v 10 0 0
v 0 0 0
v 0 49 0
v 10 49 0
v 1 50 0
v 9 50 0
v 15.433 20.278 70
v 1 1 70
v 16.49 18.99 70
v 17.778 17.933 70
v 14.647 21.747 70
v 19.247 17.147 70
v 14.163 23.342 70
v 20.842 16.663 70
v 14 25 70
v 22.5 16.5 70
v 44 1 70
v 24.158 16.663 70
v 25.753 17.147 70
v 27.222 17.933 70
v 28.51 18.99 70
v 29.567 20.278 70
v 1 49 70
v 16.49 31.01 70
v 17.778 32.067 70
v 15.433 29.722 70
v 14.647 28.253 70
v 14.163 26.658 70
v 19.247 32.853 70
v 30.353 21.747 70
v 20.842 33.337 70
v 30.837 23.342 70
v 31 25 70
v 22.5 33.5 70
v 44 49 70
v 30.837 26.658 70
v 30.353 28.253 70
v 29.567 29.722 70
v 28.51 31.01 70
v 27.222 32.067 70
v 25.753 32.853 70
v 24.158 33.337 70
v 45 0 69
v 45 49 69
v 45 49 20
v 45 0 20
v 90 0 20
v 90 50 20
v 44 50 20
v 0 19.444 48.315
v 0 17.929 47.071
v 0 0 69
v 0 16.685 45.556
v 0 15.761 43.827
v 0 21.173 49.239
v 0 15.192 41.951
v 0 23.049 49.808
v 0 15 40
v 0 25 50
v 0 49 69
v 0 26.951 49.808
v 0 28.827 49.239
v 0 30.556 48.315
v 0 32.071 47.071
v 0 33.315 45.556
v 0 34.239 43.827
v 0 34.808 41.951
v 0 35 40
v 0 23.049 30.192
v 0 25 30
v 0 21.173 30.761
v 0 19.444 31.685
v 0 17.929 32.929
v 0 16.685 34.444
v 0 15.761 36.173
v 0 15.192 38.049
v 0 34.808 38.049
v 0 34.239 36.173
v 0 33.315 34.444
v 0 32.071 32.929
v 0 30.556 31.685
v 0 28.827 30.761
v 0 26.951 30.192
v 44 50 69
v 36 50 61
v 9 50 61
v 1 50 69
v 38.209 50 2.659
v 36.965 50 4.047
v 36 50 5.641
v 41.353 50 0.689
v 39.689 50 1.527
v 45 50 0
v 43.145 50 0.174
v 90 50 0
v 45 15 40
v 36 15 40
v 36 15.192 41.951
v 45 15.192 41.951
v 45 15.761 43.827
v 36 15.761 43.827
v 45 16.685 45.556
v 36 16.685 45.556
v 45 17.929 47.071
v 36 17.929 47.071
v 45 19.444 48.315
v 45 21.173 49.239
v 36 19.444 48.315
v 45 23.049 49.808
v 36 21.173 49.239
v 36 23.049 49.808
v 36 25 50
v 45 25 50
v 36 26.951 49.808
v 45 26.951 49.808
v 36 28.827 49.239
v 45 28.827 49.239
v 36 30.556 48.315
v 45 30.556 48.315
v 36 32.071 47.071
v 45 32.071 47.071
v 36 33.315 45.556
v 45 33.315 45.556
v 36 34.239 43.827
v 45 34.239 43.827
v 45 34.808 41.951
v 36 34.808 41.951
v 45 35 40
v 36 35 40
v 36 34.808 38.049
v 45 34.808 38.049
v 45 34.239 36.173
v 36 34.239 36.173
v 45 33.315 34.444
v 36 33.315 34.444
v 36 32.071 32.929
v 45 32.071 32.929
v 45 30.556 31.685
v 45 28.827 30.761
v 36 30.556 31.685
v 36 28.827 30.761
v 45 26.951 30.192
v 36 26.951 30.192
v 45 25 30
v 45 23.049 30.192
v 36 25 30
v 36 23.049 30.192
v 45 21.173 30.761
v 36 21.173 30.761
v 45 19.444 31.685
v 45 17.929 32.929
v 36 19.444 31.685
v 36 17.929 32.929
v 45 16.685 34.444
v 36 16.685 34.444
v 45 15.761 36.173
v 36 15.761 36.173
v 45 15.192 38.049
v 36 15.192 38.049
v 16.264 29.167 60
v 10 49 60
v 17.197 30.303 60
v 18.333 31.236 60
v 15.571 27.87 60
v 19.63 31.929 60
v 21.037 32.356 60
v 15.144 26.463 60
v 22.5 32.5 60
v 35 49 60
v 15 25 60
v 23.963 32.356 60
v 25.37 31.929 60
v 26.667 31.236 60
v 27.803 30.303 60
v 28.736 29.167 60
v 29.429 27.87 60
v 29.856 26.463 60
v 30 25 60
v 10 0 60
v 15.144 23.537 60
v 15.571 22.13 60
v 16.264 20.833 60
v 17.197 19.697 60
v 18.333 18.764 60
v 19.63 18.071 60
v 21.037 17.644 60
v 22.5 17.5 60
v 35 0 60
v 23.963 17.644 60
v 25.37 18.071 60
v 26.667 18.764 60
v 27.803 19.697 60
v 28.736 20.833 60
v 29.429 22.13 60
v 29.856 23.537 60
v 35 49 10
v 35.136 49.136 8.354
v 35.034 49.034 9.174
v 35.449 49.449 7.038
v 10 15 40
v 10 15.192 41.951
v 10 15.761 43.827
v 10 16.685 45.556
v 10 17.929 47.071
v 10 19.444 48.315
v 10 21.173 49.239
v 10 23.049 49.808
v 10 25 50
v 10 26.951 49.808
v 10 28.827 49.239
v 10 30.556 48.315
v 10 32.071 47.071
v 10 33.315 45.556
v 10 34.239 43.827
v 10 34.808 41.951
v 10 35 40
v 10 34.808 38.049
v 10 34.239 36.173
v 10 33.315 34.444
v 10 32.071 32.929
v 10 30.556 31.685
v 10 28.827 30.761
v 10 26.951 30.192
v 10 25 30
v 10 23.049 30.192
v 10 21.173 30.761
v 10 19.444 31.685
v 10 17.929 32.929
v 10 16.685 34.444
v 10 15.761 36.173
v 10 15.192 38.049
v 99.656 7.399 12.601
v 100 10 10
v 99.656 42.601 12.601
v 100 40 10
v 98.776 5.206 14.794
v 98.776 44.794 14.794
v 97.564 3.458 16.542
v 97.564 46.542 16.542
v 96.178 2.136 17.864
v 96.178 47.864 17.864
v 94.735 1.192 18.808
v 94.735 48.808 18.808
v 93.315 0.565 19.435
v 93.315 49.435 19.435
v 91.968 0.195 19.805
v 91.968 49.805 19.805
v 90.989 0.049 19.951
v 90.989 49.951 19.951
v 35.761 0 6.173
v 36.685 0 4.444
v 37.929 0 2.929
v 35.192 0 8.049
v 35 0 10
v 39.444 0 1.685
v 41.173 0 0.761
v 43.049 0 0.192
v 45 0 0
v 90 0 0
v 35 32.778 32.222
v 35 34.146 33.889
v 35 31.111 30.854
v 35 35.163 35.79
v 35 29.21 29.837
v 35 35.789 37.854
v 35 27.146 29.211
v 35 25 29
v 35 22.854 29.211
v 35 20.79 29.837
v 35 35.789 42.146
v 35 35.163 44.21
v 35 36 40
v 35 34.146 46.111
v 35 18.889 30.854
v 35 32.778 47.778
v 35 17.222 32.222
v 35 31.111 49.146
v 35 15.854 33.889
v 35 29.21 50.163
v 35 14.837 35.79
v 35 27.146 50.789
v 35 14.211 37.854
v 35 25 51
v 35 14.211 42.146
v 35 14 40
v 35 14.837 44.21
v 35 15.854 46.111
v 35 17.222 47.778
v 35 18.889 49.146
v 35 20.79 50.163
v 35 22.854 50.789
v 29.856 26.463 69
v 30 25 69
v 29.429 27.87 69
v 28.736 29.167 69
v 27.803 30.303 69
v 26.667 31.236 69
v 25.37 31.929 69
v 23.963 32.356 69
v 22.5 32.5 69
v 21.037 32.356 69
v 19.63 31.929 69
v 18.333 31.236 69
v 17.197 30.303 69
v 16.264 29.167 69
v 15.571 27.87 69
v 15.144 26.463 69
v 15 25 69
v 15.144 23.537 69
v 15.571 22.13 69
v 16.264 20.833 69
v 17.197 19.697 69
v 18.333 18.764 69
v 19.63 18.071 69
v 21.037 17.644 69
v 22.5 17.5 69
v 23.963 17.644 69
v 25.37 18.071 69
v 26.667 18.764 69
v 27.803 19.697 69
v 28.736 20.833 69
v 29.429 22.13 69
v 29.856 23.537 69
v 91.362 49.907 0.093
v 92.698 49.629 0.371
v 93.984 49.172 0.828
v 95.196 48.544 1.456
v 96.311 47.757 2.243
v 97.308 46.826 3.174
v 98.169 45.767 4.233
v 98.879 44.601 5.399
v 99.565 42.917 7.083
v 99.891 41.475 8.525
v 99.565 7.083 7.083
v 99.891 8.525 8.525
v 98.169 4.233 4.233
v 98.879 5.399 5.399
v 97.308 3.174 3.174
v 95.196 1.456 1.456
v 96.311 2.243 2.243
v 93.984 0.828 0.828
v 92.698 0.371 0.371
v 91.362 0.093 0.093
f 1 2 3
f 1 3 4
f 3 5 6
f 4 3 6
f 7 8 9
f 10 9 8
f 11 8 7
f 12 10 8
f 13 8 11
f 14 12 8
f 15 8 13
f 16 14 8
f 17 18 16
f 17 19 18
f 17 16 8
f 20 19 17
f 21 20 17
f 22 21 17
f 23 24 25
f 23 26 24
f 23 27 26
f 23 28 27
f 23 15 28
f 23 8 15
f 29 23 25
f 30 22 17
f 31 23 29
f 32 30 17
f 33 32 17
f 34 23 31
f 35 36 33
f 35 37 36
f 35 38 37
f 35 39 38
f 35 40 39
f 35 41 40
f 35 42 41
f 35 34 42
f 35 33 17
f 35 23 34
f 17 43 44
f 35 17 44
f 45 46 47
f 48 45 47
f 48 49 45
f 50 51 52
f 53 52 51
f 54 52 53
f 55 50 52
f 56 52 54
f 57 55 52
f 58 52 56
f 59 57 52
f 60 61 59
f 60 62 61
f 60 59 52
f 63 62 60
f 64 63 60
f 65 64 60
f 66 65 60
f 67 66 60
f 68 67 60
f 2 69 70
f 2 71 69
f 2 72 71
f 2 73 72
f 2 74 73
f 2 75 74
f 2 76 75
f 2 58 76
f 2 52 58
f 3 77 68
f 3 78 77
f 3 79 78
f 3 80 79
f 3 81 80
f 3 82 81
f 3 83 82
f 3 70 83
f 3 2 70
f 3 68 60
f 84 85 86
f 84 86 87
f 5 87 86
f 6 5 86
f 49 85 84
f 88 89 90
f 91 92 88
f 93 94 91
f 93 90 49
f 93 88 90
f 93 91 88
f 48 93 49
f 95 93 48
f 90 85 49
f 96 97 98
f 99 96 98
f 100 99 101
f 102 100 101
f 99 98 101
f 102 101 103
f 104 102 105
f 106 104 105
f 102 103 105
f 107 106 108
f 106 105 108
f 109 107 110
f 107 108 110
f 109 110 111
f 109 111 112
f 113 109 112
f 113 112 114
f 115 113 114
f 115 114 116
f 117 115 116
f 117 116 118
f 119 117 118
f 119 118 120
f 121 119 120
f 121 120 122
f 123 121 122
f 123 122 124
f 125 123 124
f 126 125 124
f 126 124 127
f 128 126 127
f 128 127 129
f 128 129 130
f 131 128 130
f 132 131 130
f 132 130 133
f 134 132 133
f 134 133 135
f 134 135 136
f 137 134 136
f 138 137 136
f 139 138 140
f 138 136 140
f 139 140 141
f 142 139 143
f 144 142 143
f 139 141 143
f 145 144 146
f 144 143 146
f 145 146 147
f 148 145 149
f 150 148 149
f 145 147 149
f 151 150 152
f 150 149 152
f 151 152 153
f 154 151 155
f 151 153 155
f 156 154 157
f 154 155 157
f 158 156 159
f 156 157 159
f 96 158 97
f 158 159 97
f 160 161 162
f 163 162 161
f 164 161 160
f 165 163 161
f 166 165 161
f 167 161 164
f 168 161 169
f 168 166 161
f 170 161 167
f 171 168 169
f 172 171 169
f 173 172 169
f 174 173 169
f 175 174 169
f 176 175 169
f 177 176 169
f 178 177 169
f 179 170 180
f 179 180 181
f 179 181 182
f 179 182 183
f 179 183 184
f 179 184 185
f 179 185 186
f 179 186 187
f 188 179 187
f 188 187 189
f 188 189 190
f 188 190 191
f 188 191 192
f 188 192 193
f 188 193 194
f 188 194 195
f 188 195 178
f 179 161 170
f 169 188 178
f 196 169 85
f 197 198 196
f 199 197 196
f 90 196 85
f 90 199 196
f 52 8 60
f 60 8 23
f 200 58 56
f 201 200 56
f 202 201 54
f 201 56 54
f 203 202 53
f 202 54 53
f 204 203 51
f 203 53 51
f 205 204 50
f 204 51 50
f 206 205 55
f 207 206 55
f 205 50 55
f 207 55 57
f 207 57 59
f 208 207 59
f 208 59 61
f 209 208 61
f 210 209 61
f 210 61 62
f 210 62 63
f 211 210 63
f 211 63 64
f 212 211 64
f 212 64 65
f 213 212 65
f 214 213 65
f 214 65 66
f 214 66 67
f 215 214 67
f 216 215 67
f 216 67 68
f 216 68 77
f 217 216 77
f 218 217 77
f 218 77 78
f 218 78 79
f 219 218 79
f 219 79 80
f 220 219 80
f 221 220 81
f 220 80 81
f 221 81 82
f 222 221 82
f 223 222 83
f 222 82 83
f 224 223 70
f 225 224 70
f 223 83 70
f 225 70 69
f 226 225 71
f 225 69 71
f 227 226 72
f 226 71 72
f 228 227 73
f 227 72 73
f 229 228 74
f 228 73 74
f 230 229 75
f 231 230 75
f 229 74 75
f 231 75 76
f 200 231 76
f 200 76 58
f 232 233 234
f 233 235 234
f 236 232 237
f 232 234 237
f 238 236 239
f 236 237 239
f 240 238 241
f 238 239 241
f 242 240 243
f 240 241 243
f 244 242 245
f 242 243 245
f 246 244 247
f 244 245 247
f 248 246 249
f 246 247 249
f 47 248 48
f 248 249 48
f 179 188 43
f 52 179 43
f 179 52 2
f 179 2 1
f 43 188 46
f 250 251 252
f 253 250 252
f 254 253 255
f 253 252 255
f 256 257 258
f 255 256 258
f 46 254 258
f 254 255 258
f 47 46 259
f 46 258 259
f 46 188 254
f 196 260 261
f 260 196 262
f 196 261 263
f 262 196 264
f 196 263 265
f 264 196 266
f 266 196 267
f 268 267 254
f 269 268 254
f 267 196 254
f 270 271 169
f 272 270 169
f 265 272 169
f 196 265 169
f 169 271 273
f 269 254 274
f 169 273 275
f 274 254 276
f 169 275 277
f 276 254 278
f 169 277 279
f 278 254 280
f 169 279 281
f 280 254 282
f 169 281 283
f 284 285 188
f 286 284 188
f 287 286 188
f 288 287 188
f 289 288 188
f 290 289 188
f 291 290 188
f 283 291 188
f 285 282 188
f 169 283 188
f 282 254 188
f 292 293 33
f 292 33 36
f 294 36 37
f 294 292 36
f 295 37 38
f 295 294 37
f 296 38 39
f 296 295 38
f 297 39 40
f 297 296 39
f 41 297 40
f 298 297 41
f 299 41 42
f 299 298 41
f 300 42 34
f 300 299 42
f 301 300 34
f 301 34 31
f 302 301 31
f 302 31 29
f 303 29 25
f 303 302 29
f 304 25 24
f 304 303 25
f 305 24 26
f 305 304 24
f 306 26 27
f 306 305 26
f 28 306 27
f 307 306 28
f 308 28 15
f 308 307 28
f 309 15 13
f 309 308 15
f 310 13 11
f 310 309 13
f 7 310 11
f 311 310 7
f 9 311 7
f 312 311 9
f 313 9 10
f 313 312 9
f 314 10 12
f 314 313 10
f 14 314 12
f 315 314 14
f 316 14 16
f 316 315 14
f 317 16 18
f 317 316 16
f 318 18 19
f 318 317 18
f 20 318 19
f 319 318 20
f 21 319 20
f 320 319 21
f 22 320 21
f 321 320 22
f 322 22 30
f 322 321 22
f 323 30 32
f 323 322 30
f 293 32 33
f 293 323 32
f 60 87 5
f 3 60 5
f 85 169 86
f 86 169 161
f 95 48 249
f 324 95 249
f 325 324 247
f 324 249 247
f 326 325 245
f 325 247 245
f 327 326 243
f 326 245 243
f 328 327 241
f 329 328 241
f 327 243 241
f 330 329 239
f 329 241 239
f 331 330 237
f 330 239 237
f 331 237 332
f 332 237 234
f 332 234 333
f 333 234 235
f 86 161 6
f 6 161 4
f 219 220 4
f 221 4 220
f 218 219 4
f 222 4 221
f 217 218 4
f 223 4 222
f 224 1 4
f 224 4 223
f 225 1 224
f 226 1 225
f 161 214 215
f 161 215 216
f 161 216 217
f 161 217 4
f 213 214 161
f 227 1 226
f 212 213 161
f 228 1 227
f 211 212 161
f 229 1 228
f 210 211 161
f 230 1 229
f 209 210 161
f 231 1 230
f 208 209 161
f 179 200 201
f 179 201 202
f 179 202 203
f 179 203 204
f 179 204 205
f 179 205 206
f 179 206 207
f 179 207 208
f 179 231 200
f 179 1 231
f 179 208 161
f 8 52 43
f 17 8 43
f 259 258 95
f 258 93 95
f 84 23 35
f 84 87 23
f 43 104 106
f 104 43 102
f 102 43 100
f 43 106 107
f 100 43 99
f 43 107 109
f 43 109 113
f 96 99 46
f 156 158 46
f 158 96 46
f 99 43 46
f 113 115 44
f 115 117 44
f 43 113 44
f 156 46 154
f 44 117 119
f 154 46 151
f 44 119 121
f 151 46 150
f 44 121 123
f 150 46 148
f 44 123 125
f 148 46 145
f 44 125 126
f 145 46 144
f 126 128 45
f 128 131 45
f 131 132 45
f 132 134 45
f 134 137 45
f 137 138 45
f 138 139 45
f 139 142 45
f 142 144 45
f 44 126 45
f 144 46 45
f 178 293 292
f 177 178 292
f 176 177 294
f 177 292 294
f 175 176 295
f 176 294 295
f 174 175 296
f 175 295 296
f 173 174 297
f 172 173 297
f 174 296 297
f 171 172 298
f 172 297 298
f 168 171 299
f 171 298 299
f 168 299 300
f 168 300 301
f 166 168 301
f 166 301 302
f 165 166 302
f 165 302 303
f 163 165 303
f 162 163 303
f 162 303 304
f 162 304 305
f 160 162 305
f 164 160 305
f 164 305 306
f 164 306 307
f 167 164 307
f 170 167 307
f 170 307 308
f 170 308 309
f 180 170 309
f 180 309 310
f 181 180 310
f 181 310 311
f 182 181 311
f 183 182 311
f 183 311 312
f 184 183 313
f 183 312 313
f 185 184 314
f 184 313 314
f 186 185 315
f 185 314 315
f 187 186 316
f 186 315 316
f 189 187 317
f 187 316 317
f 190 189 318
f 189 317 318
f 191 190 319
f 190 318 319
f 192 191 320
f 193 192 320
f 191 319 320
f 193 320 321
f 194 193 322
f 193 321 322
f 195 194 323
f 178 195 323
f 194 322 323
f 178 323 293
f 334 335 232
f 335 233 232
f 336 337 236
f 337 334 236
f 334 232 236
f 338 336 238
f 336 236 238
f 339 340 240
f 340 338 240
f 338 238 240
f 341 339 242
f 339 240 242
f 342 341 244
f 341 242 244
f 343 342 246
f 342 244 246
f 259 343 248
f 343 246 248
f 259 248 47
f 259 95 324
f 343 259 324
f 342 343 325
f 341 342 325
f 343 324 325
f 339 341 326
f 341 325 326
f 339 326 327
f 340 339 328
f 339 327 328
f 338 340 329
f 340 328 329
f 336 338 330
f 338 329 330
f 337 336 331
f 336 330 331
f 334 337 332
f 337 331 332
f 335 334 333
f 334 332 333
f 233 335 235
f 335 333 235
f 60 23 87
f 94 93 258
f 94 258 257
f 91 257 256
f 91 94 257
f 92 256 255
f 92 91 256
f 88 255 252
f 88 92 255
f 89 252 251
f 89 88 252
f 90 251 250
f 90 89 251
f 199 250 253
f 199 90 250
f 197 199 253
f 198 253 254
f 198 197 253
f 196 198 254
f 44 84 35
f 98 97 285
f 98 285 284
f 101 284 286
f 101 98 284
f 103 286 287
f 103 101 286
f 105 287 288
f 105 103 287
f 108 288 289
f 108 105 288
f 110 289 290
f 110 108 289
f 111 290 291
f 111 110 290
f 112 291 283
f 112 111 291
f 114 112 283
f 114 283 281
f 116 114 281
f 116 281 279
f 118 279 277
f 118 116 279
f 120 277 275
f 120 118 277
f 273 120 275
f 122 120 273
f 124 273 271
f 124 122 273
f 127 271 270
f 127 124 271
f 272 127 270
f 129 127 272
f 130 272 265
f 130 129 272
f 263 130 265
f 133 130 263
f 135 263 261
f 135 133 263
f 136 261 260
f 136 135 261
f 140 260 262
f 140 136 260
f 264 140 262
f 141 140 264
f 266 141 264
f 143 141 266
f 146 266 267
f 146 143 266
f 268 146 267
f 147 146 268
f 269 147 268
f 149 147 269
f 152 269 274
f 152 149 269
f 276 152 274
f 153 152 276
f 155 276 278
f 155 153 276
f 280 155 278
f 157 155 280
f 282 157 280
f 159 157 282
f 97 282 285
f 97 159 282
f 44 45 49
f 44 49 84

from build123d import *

# Parameters (mm, degrees)
F0_W     = 100
F0_H     = 50
F1_DEPTH = 20
F2_W     = 45
F2_H     = 50
F3_DEPTH = 50
F4_W     = 25
F4_H     = 60
F5_DEPTH = 50.001
F6_R     = 10
F7_DEPTH = 45
F8_R     = 7.5
F9_DEPTH = 70.001
F10_SIZE = 1
F11_R    = 9.99999


# Not quite as in the source:
# - a fillet or chamfer is up to 0.001 mm smaller than in the source, because OpenCascade refuses the exact size


with BuildPart() as f1:
    # F0 (on Top) → F1 (new body)
    with BuildSketch(Plane.XY):
        with Locations((50, 25)):
            Rectangle(F0_W, F0_H)
    extrude(amount=F1_DEPTH)

    # F2 (on face) → F3 (join)
    with BuildSketch(Plane.XY.offset(20)):
        with Locations((22.5, 25)):
            Rectangle(F2_W, F2_H)
    extrude(amount=F3_DEPTH)

    # F4 (on face) → F5 (cut, through all)
    with BuildSketch(Plane.XZ):
        with Locations((22.5, 30)):
            Rectangle(F4_W, F4_H)
    extrude(amount=-F5_DEPTH, mode=Mode.SUBTRACT)

    # F6 (on face) → F7 (cut, through all)
    with BuildSketch(Plane(origin=(0, 0, 0), x_dir=(0, -1, 0), z_dir=(-1, 0, 0))):
        with Locations((-25, 40)):
            Circle(F6_R)
    extrude(amount=-F7_DEPTH, mode=Mode.SUBTRACT)

    # F8 (on face) → F9 (cut, through all)
    with BuildSketch(Plane.XY.offset(70)):
        with Locations((22.5, 25)):
            Circle(F8_R)
    extrude(amount=-F9_DEPTH, mode=Mode.SUBTRACT)

    # F10
    f10_edges = [f1.edges().sort_by_distance(p)[0] for p in [
        (45, 50, 45),
        (22.5, 50, 70),
        (45, 25, 70),
        (0, 25, 70),
        (0, 50, 35),
        (10, 50, 30),
        (22.5, 50, 60),
        (35, 50, 30),
        (35, 35, 40),
        (15, 25, 70),
        (22.5, 0, 70),
    ]]
    chamfer(f10_edges, length=F10_SIZE)

    # F11 (radius 10 in the source; OpenCascade refuses exactly that, so slightly less here)
    f11_edges = [f1.edges().sort_by_distance(p)[0] for p in [
        (35, 24.5, 0),
        (100, 25, 0),
        (100, 0, 10),
        (100, 25, 20),
        (100, 50, 10),
    ]]
    fillet(f11_edges, radius=F11_R)


solid = f1.part
